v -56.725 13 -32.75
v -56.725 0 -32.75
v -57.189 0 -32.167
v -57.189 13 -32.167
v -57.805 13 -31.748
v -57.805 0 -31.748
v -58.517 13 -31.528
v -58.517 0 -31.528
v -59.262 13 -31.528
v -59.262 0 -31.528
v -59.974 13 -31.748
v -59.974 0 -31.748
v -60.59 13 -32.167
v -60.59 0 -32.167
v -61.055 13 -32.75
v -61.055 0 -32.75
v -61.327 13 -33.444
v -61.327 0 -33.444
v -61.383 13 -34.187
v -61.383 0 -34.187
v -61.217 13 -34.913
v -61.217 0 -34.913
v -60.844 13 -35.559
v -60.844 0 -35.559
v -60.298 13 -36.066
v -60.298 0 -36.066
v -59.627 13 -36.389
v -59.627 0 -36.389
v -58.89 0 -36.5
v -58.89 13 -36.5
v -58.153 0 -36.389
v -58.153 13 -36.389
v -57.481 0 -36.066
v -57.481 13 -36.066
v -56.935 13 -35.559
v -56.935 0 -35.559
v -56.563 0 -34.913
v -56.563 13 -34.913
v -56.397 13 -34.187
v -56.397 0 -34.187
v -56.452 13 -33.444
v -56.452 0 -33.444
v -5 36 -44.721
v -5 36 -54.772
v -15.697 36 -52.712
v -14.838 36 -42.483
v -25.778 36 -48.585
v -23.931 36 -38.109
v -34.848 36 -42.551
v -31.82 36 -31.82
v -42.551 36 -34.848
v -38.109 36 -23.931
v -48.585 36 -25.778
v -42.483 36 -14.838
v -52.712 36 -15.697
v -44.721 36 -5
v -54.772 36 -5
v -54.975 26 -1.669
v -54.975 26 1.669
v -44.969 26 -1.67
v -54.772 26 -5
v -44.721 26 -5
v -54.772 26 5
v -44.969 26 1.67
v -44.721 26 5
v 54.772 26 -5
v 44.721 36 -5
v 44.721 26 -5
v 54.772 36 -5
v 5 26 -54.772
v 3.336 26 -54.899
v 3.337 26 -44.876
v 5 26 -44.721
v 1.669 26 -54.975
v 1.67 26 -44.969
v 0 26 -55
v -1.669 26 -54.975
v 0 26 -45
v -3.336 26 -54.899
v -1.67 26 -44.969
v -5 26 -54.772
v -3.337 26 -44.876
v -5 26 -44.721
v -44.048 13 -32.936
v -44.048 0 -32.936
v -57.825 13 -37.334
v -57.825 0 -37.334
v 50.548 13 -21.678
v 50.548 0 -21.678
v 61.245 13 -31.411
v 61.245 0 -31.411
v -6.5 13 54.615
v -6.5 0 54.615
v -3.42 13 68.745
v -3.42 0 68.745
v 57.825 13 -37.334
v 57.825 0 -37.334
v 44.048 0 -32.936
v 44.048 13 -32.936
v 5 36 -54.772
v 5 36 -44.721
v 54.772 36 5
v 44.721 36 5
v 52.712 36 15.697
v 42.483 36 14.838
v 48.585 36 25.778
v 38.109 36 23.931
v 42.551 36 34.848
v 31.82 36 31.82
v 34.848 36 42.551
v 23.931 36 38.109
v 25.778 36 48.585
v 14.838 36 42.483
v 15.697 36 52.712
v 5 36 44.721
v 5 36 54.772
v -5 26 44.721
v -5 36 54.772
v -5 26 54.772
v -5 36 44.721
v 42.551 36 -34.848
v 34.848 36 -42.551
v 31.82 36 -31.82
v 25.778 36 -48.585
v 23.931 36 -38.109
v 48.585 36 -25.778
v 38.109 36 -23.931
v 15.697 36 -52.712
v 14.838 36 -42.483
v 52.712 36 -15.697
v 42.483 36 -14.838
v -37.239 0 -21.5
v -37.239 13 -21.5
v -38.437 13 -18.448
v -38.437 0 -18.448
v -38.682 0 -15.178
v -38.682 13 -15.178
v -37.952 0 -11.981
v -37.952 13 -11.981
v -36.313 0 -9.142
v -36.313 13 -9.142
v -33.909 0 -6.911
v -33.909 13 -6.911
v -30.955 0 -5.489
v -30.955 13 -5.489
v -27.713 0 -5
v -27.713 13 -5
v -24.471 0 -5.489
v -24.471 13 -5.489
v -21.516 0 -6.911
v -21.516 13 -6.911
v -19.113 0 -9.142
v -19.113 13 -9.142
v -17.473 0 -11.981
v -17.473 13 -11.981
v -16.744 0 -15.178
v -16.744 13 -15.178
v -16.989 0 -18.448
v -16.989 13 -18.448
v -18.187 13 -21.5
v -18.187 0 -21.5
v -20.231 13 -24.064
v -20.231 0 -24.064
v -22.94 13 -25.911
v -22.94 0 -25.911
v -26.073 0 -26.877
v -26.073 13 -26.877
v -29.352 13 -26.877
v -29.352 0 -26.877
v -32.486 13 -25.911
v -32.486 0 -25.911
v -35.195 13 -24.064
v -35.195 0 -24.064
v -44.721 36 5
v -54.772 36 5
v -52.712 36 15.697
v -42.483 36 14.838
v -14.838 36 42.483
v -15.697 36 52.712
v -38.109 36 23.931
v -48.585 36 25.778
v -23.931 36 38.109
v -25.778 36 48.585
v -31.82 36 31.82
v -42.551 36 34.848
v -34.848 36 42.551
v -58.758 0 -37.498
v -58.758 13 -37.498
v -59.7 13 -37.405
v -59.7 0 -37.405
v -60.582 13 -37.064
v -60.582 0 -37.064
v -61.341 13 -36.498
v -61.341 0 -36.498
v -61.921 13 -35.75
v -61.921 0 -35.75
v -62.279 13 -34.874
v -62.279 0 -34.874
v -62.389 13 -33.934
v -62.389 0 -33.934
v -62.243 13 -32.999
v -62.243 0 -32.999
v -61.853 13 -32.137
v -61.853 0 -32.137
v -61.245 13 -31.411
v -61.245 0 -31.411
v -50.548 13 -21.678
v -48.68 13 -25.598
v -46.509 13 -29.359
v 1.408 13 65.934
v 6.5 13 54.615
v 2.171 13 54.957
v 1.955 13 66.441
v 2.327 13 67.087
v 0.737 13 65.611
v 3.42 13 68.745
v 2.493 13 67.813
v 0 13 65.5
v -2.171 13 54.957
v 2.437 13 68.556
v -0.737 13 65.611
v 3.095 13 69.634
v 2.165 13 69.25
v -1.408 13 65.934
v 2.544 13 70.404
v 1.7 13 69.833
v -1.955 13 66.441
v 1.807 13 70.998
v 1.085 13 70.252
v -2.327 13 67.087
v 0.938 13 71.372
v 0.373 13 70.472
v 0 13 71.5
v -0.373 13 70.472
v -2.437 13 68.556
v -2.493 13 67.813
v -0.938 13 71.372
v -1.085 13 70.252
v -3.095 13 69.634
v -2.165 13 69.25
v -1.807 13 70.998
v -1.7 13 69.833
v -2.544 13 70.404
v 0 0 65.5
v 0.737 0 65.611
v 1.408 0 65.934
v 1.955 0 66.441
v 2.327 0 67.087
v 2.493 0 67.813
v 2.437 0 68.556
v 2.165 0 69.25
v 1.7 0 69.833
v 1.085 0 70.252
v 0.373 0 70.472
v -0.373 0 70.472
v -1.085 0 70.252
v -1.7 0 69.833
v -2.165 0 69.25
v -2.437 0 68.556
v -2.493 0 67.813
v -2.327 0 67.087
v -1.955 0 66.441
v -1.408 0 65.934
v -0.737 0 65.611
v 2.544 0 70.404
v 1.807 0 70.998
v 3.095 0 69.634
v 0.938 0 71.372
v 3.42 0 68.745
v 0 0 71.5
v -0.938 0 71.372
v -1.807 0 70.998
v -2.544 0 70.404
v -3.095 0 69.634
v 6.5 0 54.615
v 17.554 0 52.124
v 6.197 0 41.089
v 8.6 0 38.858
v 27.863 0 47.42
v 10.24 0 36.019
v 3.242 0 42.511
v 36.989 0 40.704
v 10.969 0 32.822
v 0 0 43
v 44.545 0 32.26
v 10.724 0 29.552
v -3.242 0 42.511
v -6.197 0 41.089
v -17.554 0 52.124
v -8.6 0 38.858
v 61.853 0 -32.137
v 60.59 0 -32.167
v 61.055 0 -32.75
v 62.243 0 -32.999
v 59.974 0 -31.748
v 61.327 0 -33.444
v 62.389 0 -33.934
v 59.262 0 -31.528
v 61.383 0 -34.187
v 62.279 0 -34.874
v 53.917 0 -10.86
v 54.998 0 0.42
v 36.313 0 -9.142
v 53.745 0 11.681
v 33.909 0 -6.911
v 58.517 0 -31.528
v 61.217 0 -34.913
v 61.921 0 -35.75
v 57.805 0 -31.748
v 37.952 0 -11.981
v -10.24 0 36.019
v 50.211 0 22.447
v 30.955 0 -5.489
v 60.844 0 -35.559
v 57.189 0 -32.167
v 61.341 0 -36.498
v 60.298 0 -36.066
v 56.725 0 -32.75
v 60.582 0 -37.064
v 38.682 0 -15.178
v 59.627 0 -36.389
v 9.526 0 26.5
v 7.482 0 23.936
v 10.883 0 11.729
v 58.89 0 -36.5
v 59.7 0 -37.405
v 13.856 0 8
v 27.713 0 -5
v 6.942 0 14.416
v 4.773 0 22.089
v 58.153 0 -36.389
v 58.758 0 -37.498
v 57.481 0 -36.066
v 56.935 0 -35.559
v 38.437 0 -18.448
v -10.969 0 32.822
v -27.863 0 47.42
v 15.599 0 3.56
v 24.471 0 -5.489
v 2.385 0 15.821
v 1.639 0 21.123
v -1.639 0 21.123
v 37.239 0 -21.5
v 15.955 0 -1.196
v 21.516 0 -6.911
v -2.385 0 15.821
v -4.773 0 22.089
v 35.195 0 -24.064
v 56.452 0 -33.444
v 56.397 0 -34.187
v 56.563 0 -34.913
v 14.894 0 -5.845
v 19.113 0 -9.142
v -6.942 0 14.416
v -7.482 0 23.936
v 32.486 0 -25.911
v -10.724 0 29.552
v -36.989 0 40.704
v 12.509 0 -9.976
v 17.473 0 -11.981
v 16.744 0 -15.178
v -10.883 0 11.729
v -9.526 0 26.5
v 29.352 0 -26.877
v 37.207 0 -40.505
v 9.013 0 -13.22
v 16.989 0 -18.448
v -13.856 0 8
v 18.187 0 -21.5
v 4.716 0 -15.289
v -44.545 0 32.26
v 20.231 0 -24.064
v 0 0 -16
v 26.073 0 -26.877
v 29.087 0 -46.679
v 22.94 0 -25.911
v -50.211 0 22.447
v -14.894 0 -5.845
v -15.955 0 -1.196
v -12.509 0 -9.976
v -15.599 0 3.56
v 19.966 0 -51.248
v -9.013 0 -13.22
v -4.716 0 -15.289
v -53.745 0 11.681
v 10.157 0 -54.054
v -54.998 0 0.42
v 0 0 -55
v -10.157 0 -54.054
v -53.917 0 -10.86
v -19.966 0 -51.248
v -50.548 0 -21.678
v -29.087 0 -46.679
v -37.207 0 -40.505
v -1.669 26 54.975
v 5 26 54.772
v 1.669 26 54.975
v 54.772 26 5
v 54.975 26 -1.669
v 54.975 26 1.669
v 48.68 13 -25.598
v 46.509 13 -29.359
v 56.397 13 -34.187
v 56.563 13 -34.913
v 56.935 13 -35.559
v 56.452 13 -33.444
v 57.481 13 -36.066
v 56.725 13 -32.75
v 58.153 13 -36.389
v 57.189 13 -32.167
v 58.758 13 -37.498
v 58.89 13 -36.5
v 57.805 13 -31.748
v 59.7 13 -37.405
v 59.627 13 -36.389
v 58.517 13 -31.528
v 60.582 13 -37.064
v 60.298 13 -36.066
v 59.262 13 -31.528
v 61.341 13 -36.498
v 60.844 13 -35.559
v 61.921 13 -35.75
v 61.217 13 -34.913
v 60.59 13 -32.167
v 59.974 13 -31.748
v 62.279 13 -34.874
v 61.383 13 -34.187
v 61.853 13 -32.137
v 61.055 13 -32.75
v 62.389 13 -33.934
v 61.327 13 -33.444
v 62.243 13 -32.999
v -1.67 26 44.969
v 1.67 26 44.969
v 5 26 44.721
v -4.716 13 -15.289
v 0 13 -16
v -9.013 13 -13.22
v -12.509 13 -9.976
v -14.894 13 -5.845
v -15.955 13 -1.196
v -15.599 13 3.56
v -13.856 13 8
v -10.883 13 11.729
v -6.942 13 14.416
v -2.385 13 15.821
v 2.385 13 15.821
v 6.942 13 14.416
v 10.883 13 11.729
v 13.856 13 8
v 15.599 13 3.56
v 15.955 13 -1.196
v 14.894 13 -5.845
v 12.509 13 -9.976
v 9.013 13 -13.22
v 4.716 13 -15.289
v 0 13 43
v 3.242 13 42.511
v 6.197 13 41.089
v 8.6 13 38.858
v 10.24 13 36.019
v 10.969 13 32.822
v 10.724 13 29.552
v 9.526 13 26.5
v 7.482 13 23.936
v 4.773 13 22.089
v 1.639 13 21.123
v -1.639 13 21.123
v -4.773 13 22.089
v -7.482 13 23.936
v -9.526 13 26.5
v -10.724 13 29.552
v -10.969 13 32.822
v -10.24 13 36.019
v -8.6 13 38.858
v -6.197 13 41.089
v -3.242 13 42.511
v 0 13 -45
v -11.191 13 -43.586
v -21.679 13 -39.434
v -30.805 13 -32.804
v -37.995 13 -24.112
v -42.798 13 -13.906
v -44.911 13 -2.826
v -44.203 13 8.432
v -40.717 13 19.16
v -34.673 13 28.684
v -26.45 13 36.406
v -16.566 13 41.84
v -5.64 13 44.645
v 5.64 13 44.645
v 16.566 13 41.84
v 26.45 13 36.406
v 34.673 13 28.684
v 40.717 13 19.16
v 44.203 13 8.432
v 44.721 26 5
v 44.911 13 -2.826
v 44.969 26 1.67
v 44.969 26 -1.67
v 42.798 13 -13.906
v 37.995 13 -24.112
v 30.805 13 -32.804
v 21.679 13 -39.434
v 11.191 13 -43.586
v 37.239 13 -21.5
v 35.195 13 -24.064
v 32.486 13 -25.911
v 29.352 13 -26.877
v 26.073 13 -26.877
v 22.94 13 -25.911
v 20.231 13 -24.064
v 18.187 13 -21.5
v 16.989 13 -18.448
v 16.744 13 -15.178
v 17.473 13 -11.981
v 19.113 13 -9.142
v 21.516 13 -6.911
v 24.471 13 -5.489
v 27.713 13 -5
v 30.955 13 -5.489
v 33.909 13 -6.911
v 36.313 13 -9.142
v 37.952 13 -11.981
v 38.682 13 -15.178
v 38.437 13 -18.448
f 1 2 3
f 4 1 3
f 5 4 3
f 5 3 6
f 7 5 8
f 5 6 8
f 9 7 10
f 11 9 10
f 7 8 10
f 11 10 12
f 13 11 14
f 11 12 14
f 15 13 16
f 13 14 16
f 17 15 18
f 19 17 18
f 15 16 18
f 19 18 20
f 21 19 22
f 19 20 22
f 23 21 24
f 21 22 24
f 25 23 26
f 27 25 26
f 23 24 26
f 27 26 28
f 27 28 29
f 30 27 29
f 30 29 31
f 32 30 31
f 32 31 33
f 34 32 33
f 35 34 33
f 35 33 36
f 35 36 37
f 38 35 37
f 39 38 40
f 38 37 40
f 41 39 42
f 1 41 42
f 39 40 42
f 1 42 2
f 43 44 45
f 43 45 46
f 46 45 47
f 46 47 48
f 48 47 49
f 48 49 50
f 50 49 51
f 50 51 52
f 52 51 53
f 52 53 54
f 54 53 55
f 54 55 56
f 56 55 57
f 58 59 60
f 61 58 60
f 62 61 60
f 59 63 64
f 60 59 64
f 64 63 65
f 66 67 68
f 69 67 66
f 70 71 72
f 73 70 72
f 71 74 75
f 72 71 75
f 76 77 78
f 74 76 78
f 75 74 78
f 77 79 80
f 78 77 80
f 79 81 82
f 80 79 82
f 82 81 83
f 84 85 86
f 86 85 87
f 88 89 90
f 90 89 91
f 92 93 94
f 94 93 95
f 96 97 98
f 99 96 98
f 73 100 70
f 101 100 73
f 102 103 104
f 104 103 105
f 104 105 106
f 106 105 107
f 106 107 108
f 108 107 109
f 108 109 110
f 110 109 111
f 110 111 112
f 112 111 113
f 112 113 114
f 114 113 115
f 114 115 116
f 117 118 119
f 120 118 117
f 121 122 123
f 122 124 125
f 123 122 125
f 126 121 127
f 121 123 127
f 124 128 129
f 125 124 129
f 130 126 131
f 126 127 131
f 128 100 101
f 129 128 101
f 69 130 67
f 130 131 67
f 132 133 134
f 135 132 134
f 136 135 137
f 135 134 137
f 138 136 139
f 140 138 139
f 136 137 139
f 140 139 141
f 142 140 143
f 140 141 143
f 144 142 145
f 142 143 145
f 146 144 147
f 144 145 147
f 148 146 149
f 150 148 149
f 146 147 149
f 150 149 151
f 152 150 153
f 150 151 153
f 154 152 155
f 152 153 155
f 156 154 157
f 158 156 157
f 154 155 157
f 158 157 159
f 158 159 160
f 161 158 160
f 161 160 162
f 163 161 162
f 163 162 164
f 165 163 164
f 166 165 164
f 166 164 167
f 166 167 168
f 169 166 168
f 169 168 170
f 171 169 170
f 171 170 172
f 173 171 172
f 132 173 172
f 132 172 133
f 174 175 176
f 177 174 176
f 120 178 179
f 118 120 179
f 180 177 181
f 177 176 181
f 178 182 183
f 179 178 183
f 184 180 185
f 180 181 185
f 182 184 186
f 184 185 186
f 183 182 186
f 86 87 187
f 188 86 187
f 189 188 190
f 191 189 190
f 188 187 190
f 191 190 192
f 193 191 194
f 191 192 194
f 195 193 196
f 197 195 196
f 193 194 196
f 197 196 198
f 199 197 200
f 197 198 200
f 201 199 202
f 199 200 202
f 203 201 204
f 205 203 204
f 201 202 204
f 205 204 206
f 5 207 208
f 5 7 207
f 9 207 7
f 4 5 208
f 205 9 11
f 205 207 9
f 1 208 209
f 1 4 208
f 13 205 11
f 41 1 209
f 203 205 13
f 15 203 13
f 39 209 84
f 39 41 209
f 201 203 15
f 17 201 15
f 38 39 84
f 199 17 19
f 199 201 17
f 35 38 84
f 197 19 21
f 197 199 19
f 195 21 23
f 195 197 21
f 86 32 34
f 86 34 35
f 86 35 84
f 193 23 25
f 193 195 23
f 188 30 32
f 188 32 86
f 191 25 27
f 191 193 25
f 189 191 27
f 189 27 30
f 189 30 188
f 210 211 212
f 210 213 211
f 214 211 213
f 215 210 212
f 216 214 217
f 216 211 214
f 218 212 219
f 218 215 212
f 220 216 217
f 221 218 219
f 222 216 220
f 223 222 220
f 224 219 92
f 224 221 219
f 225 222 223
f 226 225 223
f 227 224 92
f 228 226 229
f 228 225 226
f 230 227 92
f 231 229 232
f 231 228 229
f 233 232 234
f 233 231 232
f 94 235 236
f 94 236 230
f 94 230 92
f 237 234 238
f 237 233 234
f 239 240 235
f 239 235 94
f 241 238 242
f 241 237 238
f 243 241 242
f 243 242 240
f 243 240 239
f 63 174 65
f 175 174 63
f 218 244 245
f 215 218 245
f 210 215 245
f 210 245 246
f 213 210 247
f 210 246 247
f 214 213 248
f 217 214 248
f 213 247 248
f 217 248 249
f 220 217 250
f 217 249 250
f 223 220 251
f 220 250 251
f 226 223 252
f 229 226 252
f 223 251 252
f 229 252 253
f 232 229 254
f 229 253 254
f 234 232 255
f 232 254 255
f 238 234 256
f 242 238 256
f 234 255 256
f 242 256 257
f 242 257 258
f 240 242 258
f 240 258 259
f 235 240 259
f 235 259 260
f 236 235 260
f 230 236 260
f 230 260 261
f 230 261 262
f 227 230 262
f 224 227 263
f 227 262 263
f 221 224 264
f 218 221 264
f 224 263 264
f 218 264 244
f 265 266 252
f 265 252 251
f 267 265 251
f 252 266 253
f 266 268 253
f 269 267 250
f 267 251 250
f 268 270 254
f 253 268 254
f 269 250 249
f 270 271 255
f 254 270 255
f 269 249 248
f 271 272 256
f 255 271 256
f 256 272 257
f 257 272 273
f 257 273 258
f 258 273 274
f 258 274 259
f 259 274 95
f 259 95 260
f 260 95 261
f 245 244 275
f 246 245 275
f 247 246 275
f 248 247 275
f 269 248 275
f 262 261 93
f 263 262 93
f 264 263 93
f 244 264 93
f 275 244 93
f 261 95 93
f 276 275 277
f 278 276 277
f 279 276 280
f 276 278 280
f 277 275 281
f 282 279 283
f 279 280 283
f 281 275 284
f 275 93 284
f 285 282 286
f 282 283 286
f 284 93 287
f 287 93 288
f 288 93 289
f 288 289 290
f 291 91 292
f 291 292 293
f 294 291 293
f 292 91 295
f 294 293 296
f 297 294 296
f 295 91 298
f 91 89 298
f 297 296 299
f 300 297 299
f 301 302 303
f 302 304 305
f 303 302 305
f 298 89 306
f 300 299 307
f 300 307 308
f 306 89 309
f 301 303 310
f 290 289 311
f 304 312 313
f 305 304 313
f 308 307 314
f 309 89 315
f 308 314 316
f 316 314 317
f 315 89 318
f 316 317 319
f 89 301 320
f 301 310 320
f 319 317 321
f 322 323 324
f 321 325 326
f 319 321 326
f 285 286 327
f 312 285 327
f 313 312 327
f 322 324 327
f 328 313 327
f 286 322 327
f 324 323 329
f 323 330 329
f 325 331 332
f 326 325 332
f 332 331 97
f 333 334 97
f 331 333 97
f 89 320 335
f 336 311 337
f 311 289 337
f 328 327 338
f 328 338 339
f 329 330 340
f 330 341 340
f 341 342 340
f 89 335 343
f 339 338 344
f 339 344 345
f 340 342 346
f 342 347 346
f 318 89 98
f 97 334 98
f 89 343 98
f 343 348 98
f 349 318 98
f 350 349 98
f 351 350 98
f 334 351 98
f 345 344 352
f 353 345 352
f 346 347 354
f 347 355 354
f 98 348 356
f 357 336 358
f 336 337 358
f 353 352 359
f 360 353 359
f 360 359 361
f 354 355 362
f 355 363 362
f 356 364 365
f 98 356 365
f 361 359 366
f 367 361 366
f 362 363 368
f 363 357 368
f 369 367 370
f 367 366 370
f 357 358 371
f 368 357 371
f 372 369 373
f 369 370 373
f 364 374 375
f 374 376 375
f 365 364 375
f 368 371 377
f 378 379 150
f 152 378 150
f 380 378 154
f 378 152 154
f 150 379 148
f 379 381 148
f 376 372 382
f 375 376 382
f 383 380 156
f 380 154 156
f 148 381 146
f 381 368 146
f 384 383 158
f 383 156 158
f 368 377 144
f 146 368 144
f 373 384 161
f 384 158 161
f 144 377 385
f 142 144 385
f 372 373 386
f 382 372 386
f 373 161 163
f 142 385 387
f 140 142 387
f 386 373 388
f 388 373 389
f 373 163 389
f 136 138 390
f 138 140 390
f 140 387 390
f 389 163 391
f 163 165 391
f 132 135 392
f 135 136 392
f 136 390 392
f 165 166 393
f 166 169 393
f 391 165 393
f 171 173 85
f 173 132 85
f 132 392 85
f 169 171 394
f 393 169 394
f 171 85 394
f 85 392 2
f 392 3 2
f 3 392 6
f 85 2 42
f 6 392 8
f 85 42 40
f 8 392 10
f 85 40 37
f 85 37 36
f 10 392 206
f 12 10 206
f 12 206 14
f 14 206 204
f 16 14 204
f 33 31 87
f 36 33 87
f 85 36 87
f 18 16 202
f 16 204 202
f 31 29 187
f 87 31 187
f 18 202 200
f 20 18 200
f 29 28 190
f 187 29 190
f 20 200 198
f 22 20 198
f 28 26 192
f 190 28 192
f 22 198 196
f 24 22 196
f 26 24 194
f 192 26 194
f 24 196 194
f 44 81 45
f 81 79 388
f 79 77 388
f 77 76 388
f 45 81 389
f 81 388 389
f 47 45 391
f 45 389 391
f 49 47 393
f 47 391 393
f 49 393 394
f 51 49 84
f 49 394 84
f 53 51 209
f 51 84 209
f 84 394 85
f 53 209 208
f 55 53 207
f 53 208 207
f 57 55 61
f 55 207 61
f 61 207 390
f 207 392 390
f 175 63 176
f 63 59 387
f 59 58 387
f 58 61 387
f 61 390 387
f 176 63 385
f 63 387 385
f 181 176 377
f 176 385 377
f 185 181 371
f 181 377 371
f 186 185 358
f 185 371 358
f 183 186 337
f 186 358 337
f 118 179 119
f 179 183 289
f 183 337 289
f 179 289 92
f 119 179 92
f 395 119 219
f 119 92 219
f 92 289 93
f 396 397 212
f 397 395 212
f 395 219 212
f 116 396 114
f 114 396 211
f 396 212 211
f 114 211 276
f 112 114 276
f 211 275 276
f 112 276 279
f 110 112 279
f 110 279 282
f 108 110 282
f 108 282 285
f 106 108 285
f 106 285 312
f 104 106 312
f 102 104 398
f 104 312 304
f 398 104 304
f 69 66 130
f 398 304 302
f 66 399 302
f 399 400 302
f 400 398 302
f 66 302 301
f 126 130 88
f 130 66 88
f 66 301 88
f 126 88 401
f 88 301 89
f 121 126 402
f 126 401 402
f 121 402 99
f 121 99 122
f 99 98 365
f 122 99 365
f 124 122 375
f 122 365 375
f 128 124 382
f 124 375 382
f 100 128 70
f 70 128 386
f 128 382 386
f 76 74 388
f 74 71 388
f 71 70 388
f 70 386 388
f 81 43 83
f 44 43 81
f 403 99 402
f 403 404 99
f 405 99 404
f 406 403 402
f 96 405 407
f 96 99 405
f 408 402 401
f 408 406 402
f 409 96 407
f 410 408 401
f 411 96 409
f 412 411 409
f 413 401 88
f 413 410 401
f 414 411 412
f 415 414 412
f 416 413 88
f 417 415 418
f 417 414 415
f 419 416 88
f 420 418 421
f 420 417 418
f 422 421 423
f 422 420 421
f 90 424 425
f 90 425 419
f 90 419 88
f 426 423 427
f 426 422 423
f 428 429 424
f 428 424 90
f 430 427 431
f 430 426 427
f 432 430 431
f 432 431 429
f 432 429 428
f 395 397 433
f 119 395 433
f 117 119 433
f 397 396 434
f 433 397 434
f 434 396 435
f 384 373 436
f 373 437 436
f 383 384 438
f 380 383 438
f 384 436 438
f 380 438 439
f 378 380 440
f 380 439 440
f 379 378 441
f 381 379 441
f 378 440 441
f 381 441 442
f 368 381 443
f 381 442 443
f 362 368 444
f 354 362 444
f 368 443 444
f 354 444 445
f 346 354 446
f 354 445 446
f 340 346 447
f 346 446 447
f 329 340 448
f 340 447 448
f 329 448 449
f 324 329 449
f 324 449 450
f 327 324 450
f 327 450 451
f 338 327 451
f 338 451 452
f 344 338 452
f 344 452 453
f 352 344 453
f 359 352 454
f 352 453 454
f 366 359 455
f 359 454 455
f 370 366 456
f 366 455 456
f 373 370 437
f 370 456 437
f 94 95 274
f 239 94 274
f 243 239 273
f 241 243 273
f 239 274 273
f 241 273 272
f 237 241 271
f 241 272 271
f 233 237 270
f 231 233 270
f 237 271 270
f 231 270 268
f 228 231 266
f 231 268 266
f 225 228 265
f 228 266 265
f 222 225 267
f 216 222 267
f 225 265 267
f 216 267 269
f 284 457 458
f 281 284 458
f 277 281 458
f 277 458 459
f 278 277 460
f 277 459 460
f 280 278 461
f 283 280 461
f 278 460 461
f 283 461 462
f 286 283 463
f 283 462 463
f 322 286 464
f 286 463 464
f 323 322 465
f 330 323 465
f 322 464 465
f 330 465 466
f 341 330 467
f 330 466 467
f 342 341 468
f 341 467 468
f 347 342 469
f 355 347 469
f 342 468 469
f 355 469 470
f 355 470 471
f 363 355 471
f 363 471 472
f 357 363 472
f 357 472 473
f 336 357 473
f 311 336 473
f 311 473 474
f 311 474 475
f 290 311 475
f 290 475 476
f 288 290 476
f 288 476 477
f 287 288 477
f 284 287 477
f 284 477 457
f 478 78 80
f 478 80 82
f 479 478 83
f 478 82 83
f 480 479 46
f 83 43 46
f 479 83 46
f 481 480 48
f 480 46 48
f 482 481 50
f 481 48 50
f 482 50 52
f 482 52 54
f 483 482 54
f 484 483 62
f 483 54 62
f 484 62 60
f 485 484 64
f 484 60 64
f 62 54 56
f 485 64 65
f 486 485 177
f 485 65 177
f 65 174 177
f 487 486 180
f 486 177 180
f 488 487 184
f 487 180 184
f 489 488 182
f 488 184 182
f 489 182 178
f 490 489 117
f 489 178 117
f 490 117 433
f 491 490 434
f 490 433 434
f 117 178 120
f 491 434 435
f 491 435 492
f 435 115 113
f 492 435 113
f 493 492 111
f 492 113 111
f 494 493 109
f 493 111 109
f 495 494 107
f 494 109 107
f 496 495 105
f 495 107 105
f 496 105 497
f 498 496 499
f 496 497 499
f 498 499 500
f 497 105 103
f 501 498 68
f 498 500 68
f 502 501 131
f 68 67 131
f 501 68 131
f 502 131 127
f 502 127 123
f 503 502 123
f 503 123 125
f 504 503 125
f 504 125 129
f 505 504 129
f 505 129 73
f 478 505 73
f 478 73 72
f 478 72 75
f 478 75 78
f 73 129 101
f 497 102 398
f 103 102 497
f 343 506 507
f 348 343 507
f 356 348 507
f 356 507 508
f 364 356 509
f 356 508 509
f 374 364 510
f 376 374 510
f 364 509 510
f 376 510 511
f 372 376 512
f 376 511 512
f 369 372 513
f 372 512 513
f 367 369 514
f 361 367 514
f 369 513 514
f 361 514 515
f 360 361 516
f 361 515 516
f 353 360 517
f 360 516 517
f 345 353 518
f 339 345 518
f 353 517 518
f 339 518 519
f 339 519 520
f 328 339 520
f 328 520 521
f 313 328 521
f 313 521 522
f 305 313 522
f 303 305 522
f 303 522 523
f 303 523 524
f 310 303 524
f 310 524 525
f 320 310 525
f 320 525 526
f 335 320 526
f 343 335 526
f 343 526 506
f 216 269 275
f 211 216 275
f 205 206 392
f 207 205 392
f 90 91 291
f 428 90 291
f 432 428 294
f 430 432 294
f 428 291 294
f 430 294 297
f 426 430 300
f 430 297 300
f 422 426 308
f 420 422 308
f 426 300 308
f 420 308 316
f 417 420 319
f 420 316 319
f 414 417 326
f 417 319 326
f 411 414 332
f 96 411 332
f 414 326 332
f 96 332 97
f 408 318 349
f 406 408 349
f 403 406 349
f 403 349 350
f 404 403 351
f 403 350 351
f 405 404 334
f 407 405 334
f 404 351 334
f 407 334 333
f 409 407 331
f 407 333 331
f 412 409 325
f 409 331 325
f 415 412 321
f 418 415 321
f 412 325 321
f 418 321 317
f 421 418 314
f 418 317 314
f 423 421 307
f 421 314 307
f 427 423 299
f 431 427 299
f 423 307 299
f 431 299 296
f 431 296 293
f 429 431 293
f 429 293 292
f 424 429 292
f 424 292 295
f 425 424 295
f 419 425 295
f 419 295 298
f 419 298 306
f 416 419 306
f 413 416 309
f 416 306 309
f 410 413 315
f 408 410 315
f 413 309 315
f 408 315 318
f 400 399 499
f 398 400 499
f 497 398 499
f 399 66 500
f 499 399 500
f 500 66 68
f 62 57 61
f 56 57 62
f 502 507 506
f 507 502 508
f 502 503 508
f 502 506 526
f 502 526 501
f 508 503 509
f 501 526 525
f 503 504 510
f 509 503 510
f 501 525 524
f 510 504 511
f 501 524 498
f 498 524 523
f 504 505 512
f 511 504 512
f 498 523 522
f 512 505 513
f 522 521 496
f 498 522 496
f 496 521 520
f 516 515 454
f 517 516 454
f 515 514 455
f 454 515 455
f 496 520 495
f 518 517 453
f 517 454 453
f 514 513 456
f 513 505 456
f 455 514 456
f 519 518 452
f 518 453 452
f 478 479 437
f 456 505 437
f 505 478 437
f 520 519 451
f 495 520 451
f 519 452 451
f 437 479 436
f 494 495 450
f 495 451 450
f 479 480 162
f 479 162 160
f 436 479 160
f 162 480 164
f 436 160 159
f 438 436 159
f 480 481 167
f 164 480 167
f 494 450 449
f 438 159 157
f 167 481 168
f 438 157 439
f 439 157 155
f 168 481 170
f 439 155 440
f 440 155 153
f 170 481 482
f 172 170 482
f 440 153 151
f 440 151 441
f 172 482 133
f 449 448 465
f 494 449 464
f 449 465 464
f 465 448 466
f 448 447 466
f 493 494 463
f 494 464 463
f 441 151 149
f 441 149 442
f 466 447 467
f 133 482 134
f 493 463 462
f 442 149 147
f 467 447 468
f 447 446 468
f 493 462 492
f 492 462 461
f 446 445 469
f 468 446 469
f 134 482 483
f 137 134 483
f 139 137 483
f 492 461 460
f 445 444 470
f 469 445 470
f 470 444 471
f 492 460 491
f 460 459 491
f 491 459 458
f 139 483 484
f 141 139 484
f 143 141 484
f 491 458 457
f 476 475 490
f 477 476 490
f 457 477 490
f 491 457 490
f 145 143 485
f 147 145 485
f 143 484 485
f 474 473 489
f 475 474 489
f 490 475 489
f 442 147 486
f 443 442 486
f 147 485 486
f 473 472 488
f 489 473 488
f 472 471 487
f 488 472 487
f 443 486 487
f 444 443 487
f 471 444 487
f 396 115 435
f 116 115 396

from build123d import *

# Parameters (mm, degrees)
CUT_EXTRUDE1_DEPTH  = 10
CIRPATTERN1_COUNT   = 4
SKETCH3_R           = 11
CUT_EXTRUDE2_DEPTH  = 82.111035008
CIRPATTERN2_COUNT   = 3
SKETCH5_R           = 2.5
BOSS_EXTRUDE1_DEPTH = 13
CIRPATTERN3_COUNT   = 3


with BuildPart() as part:
    # Sketch1 → Revolve2 (revolve)
    with BuildSketch(Plane.XY, mode=Mode.PRIVATE) as revolve2_sk:
        Polygon((16, 0), (16, 13), (45, 13), (45, 36), (55, 36), (55, 0), align=None)
    revolve(revolve2_sk.sketch.rotate(Axis((0, 0, 0), (0, 1, 0)), 90), axis=Axis((0, 0, 0), (0, 1, 0)))

    # Sketch2 → Cut-Extrude1 (cut)
    with BuildSketch(Plane(origin=(0, 36, 0), x_dir=(1, 0, 0), z_dir=(0, 1, 0))):
        with BuildLine():
            Line((44.72135955, 5), (54.772255751, 5))
            ThreePointArc((54.772255751, 5), (55, 0), (54.772255751, -5))
            Line((54.772255751, -5), (44.72135955, -5))
            ThreePointArc((44.72135955, -5), (45, 0), (44.72135955, 5))
        make_face()
    cut_extrude1 = extrude(amount=-CUT_EXTRUDE1_DEPTH, mode=Mode.SUBTRACT)

    # CirPattern1: Cut-Extrude1 ×4 about axis
    cirpattern1_axis = Axis((0, 0, 0), (0, 1, 0))
    for i in range(1, CIRPATTERN1_COUNT):
        add(cut_extrude1.rotate(cirpattern1_axis, i * 360 / CIRPATTERN1_COUNT), mode=Mode.SUBTRACT)

    # Sketch3 → Cut-Extrude2 (cut, through all)
    with BuildSketch(Plane(origin=(0, 13, 0), x_dir=(1, 0, 0), z_dir=(0, 1, 0))):
        with Locations(Location((0, -32, 0), (0, 0, 270))):
            Circle(SKETCH3_R)
    cut_extrude2 = extrude(amount=-CUT_EXTRUDE2_DEPTH, mode=Mode.SUBTRACT)

    # CirPattern2: Cut-Extrude2 ×3 about axis
    cirpattern2_axis = Axis((0, 0, 0), (0, 1, 0))
    for i in range(1, CIRPATTERN2_COUNT):
        add(cut_extrude2.rotate(cirpattern2_axis, i * 360 / CIRPATTERN2_COUNT), mode=Mode.SUBTRACT)

    # Sketch5 → Boss-Extrude1 (add)
    with BuildSketch(Plane.XZ):
        with BuildLine():
            Line((-6.5, 54.614558499), (-3.419696086, 68.745438584))
            ThreePointArc((-3.419696086, 68.745438584), (0, 71.5), (3.419696086, 68.745438584))
            Line((3.419696086, 68.745438584), (6.5, 54.614558499))
            ThreePointArc((6.5, 54.614558499), (0, 55), (-6.5, 54.614558499))
        make_face()
        with Locations(Location((0, 68, 0), (0, 0, 270))):
            Circle(SKETCH5_R, mode=Mode.SUBTRACT)
    boss_extrude1 = extrude(amount=-BOSS_EXTRUDE1_DEPTH)

    # CirPattern3: Boss-Extrude1 ×3 about axis
    cirpattern3_axis = Axis((0, 0, 0), (0, 1, 0))
    for i in range(1, CIRPATTERN3_COUNT):
        add(boss_extrude1.rotate(cirpattern3_axis, i * 360 / CIRPATTERN3_COUNT))


solid = part.part
